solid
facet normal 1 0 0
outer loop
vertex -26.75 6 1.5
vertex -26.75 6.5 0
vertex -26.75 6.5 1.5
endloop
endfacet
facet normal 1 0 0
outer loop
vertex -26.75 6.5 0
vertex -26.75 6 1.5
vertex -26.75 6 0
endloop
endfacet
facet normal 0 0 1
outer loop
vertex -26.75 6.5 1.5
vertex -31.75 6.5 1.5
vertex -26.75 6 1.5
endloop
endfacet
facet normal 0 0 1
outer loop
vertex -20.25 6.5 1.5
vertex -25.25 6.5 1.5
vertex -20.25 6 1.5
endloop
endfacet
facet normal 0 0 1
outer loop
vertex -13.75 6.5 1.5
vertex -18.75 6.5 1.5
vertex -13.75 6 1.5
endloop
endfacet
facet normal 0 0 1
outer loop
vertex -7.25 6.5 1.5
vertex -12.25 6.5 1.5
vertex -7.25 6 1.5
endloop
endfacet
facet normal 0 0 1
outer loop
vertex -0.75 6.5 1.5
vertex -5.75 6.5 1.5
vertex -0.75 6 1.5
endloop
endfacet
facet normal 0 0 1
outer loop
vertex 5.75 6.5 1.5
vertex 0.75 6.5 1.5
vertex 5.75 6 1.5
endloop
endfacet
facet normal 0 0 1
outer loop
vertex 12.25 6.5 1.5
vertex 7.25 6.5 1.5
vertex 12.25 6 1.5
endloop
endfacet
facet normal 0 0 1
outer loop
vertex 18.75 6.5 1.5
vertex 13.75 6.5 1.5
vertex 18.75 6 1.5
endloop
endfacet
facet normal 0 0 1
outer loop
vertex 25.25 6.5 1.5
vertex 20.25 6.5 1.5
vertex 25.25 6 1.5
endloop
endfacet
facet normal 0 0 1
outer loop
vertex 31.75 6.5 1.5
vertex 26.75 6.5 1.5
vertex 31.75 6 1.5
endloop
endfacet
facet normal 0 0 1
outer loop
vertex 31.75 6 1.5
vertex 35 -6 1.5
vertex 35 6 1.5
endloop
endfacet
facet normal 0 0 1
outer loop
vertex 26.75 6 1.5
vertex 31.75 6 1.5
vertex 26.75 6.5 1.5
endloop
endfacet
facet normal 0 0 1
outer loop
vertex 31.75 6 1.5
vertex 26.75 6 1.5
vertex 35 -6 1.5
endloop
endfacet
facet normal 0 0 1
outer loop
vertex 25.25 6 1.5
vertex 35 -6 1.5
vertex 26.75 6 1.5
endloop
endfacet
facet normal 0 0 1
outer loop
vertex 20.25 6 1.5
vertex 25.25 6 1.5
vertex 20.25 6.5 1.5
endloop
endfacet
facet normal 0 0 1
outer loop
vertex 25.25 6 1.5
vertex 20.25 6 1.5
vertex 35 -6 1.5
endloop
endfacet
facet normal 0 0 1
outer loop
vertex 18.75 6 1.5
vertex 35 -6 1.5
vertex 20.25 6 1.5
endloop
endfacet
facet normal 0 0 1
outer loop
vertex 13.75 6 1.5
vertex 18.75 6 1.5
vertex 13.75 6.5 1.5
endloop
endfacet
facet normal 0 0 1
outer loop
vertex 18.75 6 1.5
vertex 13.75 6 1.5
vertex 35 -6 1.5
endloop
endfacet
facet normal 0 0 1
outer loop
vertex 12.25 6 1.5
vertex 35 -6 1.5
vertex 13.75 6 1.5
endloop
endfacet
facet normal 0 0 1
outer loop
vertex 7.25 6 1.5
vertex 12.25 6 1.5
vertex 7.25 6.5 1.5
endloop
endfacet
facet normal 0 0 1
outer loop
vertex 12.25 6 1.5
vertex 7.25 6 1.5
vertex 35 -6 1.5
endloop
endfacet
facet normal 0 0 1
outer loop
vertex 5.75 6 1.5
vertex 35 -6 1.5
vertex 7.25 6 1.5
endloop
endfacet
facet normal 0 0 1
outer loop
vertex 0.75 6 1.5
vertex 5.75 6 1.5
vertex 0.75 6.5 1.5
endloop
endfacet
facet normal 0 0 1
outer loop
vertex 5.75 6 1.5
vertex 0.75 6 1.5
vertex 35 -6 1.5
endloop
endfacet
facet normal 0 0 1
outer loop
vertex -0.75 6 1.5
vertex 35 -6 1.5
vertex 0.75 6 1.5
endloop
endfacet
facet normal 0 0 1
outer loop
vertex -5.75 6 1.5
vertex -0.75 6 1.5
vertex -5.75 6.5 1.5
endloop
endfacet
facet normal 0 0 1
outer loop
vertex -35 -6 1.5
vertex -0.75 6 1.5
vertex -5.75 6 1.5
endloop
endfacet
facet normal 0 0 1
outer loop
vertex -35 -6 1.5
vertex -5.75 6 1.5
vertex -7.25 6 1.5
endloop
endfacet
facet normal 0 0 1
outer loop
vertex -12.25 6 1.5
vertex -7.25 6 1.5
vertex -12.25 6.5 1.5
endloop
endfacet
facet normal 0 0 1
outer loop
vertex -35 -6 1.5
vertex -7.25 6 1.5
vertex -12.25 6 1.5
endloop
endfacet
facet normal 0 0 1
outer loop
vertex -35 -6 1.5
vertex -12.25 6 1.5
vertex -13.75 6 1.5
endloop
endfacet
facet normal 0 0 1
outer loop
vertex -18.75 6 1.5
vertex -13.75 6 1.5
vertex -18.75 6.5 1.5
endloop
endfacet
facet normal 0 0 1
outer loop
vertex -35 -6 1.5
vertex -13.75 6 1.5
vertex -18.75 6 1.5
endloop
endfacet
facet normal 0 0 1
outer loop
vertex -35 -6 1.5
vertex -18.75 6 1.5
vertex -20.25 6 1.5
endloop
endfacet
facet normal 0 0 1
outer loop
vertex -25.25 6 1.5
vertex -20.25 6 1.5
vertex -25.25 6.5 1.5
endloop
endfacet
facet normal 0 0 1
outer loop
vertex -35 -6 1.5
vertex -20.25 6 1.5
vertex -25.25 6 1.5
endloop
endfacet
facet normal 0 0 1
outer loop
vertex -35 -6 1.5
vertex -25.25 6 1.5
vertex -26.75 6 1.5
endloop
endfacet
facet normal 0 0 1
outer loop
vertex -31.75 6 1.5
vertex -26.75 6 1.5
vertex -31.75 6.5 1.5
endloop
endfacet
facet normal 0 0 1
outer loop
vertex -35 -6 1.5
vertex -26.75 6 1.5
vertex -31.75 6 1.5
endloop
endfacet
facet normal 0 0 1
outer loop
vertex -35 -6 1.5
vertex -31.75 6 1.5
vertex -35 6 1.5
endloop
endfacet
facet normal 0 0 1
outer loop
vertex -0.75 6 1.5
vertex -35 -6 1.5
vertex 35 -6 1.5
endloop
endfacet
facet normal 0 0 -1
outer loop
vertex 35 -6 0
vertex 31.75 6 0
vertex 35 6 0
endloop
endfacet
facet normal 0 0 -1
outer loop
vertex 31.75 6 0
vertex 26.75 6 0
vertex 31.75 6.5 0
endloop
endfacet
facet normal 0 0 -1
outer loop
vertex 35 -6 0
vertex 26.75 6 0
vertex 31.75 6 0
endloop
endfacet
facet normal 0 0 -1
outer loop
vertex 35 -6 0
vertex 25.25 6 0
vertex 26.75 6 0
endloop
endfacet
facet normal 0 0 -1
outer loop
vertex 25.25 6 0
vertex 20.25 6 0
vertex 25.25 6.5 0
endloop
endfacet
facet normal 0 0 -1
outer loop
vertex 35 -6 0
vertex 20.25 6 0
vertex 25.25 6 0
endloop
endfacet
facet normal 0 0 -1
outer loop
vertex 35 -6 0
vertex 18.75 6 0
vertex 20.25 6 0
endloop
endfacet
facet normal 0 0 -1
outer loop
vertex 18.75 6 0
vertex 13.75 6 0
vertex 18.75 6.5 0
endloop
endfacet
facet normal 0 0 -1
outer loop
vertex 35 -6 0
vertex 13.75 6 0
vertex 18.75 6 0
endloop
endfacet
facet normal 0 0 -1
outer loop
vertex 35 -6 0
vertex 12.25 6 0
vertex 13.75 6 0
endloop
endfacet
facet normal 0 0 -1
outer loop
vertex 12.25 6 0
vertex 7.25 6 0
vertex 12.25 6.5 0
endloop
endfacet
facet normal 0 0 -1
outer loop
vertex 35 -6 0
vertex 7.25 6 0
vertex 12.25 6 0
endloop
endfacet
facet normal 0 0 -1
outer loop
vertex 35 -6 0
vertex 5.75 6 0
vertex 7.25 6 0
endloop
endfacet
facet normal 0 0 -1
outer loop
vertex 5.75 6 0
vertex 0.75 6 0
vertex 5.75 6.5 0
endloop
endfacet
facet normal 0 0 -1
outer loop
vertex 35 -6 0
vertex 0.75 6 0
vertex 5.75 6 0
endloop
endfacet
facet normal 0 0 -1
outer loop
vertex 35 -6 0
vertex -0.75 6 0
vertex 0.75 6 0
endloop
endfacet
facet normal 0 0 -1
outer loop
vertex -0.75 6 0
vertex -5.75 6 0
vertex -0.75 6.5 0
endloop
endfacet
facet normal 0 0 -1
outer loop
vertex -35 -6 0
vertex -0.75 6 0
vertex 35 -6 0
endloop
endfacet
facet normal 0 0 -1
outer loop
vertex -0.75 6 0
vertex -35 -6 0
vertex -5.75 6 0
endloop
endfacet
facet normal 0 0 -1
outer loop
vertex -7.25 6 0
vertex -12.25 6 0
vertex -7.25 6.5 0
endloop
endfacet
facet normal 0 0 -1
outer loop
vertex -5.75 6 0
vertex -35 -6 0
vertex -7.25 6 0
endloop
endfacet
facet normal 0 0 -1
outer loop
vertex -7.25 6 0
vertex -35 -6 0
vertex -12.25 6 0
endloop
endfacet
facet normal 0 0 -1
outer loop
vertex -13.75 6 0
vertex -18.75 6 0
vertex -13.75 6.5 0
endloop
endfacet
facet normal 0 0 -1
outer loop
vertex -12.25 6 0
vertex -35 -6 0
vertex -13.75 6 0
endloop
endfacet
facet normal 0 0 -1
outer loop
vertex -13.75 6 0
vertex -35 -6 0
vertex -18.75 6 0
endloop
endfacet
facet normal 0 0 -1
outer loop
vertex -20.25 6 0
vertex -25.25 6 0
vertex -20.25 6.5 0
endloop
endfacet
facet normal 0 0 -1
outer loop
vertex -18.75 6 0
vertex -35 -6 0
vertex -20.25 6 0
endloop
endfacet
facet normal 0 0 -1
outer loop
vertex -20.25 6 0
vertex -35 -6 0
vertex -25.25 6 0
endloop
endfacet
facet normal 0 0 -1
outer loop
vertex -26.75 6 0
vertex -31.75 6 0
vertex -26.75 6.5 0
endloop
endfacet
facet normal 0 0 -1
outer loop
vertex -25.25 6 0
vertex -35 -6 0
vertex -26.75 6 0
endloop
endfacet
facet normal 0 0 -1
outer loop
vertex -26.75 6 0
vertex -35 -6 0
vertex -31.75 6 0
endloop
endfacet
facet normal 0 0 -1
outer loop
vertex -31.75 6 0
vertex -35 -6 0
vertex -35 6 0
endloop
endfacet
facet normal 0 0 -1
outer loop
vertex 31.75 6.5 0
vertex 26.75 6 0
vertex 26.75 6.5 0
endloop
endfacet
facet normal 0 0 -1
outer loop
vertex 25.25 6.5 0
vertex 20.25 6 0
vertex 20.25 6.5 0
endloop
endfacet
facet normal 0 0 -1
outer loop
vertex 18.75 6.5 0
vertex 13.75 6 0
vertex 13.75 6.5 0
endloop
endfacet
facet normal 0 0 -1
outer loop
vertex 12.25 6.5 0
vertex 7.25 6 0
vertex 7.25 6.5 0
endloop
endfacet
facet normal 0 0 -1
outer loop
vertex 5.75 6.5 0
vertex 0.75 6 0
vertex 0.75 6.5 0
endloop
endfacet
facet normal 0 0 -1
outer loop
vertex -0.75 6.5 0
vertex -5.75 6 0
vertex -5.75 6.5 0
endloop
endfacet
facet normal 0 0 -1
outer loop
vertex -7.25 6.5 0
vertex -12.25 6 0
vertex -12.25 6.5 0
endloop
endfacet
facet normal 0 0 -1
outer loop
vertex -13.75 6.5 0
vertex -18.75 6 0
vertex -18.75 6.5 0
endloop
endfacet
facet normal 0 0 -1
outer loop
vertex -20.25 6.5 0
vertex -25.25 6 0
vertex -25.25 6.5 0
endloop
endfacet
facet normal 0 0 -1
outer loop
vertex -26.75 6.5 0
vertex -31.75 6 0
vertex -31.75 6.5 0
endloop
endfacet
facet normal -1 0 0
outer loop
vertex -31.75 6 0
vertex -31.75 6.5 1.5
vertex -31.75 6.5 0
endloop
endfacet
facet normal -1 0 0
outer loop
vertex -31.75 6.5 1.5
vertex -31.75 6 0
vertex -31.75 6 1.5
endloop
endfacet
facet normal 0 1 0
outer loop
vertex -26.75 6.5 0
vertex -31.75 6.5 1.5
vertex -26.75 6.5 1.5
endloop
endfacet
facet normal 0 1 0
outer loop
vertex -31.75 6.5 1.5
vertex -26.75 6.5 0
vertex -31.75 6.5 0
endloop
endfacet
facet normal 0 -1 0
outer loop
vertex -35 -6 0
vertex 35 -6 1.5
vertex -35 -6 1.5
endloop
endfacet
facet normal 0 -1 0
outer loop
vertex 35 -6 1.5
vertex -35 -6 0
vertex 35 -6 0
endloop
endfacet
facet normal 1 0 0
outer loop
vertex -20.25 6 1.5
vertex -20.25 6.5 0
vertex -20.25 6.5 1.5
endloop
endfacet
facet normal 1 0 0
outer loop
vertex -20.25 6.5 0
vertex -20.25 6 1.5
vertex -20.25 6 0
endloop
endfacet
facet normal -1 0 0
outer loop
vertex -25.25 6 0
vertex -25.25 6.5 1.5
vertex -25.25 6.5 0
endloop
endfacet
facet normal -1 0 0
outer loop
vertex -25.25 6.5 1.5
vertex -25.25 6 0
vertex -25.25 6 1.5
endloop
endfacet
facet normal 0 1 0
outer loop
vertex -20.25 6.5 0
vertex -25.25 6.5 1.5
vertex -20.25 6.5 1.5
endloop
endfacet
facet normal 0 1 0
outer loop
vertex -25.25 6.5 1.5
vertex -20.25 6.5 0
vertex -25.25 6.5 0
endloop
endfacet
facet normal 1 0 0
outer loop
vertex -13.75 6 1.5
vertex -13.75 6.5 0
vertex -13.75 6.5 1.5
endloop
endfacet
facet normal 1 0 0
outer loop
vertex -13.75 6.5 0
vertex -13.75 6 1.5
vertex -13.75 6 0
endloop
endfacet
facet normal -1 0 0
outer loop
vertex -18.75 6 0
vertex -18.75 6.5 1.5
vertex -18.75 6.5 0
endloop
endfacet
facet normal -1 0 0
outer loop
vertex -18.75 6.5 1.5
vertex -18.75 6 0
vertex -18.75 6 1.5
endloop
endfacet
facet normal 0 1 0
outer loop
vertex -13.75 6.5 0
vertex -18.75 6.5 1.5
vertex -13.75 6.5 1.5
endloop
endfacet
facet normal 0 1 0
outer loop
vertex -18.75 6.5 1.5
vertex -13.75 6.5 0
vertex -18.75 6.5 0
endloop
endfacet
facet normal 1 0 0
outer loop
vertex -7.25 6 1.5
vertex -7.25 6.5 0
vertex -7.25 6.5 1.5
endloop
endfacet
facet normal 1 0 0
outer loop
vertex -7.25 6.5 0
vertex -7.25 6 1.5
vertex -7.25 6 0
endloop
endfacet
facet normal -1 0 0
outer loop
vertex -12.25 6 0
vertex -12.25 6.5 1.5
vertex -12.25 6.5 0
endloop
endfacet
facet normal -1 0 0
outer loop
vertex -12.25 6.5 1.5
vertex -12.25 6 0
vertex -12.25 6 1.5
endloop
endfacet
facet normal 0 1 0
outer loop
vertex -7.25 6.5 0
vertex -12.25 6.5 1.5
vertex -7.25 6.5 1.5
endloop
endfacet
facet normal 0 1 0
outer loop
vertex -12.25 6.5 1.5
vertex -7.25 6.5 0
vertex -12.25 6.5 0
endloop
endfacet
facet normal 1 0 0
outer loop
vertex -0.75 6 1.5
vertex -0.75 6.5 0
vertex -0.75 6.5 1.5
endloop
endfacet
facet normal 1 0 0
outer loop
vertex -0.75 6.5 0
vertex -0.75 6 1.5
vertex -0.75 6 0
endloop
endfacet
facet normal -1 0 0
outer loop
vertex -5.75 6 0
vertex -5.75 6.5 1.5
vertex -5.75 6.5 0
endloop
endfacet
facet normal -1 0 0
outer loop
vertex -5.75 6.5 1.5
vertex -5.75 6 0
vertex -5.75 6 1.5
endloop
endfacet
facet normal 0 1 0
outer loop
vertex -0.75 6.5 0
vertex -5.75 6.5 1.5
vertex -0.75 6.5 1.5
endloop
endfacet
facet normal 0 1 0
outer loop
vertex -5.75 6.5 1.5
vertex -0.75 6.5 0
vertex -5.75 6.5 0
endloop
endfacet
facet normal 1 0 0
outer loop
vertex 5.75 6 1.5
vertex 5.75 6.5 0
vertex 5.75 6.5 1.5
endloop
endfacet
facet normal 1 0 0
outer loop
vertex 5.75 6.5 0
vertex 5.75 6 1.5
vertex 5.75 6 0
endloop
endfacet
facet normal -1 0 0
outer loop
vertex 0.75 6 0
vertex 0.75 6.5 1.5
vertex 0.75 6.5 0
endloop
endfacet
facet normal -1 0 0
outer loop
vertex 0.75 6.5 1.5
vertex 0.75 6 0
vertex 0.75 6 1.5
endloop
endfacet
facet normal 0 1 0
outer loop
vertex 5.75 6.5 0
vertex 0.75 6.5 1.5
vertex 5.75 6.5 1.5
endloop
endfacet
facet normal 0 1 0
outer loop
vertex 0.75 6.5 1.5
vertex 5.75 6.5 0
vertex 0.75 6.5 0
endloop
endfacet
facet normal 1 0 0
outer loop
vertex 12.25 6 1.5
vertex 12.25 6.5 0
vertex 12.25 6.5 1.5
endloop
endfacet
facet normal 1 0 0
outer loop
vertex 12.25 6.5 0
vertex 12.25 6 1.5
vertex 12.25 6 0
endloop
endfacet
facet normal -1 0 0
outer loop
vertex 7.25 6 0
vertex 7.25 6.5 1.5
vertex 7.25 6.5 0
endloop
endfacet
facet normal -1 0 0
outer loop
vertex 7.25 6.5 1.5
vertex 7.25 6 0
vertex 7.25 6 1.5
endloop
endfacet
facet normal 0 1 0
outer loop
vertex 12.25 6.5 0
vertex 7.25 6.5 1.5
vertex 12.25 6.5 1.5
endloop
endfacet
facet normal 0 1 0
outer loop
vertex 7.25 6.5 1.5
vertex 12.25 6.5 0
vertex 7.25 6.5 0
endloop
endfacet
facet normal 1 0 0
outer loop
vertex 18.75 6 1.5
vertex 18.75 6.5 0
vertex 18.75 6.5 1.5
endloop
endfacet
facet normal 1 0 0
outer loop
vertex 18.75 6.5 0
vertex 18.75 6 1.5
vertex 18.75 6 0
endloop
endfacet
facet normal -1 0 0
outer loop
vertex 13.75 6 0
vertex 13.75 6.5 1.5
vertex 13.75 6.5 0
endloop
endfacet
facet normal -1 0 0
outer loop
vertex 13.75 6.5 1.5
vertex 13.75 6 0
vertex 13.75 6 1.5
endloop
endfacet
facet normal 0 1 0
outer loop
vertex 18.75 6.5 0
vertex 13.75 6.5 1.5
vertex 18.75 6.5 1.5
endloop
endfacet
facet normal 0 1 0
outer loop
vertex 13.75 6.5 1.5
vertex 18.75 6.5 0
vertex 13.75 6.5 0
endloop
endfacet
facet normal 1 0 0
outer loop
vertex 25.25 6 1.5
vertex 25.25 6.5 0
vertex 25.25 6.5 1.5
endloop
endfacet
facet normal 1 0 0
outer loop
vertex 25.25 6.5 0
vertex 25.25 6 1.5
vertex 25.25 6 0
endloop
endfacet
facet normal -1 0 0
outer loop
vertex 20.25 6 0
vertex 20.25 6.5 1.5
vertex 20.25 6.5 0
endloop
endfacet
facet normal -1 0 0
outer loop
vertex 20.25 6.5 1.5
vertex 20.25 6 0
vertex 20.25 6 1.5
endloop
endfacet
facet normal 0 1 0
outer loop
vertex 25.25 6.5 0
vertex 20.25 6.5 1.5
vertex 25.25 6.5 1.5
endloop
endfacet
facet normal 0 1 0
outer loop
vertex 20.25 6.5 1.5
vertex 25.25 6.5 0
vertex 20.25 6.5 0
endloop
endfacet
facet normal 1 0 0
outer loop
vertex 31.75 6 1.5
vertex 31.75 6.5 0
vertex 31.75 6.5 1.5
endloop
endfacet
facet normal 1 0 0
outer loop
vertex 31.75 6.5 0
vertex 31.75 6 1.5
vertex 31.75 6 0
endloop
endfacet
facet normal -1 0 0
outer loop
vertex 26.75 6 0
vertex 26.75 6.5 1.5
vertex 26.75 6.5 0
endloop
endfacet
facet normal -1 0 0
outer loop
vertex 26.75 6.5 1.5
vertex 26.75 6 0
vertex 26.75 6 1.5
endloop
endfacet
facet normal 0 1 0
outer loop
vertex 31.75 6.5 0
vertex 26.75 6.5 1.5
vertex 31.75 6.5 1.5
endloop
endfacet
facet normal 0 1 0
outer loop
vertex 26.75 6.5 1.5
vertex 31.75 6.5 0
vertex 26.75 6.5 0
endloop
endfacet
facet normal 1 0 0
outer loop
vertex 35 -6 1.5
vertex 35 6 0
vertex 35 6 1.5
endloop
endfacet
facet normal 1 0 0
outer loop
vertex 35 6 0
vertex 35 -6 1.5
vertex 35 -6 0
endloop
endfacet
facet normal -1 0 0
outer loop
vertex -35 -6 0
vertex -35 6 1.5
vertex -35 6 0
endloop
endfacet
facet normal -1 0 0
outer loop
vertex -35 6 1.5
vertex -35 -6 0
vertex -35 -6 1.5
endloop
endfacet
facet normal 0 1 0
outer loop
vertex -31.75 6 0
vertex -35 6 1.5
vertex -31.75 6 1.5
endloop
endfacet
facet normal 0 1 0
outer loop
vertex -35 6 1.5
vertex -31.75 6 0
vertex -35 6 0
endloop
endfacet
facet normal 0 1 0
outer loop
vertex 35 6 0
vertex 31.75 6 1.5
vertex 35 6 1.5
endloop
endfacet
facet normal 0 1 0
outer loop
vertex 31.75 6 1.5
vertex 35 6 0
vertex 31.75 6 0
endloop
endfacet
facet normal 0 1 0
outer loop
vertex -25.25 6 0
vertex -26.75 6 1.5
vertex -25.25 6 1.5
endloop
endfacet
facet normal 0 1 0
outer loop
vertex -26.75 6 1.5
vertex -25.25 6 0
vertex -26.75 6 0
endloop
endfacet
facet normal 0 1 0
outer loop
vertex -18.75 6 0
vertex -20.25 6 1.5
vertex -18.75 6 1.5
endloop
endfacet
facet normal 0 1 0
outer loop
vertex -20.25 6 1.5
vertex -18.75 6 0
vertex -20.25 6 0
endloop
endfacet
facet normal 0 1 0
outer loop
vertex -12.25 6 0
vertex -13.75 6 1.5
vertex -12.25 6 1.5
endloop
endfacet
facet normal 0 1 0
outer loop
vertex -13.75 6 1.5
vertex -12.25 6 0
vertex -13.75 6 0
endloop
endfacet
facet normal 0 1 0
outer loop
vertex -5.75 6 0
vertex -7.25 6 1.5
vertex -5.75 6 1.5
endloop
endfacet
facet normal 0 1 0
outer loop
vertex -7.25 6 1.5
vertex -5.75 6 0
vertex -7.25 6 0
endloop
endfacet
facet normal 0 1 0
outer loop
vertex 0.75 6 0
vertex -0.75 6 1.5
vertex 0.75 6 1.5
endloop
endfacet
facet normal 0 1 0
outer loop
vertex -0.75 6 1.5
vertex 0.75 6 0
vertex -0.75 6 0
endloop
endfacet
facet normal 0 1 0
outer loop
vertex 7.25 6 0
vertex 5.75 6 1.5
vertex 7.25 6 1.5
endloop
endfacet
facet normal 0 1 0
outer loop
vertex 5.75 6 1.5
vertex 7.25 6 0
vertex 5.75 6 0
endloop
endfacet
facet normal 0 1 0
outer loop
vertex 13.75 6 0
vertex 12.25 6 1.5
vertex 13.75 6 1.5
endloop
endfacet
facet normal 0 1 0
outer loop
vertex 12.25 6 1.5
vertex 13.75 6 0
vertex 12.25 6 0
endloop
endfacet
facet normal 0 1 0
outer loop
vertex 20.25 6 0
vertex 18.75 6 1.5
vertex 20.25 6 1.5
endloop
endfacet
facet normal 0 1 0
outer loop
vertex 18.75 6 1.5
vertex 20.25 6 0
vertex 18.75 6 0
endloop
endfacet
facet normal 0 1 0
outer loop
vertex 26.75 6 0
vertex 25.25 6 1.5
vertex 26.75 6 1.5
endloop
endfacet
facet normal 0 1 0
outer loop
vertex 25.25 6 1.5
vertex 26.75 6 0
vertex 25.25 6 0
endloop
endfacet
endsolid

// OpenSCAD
// 10-well comb for casting agarose gels
// Print orientation: lying flat on the bed, teeth pointing down (-Y)

// ---------------- Parameters ----------------
plate_t      = 1.5;   // plate thickness (Z)
spine_len    = 70;    // spine length (X)
spine_w      = 12;    // spine width (Y)
tooth_w      = 5.0;   // tooth width (X)
tooth_len    = 12;    // tooth length (Y)
tooth_count  = 10;    // number of teeth
tooth_gap    = 1.5;   // gap between neighbouring teeth (X)
eps          = 0.5;   // overhang / cut overshoot

$fn = 64;

// ---------------- Derived ----------------
pitch   = tooth_w + tooth_gap;          // centre-to-centre spacing
x_start = -(tooth_count - 1) * pitch / 2; // first tooth centre (row centred)

// ---------------- Model ----------------
union() {
    // Spine (back bar)
    translate([-spine_len / 2, -spine_w / 2, 0])
        cube([spine_len, spine_w, plate_t]);

    // Teeth hanging from the +Y edge of the spine (into -Y)
    for (i = [0 : tooth_count - 1])
        translate([x_start + i * pitch - tooth_w / 2,
                   spine_w / 2 - tooth_len,
                   0])
            cube([tooth_w, tooth_len + eps, plate_t]);
}
